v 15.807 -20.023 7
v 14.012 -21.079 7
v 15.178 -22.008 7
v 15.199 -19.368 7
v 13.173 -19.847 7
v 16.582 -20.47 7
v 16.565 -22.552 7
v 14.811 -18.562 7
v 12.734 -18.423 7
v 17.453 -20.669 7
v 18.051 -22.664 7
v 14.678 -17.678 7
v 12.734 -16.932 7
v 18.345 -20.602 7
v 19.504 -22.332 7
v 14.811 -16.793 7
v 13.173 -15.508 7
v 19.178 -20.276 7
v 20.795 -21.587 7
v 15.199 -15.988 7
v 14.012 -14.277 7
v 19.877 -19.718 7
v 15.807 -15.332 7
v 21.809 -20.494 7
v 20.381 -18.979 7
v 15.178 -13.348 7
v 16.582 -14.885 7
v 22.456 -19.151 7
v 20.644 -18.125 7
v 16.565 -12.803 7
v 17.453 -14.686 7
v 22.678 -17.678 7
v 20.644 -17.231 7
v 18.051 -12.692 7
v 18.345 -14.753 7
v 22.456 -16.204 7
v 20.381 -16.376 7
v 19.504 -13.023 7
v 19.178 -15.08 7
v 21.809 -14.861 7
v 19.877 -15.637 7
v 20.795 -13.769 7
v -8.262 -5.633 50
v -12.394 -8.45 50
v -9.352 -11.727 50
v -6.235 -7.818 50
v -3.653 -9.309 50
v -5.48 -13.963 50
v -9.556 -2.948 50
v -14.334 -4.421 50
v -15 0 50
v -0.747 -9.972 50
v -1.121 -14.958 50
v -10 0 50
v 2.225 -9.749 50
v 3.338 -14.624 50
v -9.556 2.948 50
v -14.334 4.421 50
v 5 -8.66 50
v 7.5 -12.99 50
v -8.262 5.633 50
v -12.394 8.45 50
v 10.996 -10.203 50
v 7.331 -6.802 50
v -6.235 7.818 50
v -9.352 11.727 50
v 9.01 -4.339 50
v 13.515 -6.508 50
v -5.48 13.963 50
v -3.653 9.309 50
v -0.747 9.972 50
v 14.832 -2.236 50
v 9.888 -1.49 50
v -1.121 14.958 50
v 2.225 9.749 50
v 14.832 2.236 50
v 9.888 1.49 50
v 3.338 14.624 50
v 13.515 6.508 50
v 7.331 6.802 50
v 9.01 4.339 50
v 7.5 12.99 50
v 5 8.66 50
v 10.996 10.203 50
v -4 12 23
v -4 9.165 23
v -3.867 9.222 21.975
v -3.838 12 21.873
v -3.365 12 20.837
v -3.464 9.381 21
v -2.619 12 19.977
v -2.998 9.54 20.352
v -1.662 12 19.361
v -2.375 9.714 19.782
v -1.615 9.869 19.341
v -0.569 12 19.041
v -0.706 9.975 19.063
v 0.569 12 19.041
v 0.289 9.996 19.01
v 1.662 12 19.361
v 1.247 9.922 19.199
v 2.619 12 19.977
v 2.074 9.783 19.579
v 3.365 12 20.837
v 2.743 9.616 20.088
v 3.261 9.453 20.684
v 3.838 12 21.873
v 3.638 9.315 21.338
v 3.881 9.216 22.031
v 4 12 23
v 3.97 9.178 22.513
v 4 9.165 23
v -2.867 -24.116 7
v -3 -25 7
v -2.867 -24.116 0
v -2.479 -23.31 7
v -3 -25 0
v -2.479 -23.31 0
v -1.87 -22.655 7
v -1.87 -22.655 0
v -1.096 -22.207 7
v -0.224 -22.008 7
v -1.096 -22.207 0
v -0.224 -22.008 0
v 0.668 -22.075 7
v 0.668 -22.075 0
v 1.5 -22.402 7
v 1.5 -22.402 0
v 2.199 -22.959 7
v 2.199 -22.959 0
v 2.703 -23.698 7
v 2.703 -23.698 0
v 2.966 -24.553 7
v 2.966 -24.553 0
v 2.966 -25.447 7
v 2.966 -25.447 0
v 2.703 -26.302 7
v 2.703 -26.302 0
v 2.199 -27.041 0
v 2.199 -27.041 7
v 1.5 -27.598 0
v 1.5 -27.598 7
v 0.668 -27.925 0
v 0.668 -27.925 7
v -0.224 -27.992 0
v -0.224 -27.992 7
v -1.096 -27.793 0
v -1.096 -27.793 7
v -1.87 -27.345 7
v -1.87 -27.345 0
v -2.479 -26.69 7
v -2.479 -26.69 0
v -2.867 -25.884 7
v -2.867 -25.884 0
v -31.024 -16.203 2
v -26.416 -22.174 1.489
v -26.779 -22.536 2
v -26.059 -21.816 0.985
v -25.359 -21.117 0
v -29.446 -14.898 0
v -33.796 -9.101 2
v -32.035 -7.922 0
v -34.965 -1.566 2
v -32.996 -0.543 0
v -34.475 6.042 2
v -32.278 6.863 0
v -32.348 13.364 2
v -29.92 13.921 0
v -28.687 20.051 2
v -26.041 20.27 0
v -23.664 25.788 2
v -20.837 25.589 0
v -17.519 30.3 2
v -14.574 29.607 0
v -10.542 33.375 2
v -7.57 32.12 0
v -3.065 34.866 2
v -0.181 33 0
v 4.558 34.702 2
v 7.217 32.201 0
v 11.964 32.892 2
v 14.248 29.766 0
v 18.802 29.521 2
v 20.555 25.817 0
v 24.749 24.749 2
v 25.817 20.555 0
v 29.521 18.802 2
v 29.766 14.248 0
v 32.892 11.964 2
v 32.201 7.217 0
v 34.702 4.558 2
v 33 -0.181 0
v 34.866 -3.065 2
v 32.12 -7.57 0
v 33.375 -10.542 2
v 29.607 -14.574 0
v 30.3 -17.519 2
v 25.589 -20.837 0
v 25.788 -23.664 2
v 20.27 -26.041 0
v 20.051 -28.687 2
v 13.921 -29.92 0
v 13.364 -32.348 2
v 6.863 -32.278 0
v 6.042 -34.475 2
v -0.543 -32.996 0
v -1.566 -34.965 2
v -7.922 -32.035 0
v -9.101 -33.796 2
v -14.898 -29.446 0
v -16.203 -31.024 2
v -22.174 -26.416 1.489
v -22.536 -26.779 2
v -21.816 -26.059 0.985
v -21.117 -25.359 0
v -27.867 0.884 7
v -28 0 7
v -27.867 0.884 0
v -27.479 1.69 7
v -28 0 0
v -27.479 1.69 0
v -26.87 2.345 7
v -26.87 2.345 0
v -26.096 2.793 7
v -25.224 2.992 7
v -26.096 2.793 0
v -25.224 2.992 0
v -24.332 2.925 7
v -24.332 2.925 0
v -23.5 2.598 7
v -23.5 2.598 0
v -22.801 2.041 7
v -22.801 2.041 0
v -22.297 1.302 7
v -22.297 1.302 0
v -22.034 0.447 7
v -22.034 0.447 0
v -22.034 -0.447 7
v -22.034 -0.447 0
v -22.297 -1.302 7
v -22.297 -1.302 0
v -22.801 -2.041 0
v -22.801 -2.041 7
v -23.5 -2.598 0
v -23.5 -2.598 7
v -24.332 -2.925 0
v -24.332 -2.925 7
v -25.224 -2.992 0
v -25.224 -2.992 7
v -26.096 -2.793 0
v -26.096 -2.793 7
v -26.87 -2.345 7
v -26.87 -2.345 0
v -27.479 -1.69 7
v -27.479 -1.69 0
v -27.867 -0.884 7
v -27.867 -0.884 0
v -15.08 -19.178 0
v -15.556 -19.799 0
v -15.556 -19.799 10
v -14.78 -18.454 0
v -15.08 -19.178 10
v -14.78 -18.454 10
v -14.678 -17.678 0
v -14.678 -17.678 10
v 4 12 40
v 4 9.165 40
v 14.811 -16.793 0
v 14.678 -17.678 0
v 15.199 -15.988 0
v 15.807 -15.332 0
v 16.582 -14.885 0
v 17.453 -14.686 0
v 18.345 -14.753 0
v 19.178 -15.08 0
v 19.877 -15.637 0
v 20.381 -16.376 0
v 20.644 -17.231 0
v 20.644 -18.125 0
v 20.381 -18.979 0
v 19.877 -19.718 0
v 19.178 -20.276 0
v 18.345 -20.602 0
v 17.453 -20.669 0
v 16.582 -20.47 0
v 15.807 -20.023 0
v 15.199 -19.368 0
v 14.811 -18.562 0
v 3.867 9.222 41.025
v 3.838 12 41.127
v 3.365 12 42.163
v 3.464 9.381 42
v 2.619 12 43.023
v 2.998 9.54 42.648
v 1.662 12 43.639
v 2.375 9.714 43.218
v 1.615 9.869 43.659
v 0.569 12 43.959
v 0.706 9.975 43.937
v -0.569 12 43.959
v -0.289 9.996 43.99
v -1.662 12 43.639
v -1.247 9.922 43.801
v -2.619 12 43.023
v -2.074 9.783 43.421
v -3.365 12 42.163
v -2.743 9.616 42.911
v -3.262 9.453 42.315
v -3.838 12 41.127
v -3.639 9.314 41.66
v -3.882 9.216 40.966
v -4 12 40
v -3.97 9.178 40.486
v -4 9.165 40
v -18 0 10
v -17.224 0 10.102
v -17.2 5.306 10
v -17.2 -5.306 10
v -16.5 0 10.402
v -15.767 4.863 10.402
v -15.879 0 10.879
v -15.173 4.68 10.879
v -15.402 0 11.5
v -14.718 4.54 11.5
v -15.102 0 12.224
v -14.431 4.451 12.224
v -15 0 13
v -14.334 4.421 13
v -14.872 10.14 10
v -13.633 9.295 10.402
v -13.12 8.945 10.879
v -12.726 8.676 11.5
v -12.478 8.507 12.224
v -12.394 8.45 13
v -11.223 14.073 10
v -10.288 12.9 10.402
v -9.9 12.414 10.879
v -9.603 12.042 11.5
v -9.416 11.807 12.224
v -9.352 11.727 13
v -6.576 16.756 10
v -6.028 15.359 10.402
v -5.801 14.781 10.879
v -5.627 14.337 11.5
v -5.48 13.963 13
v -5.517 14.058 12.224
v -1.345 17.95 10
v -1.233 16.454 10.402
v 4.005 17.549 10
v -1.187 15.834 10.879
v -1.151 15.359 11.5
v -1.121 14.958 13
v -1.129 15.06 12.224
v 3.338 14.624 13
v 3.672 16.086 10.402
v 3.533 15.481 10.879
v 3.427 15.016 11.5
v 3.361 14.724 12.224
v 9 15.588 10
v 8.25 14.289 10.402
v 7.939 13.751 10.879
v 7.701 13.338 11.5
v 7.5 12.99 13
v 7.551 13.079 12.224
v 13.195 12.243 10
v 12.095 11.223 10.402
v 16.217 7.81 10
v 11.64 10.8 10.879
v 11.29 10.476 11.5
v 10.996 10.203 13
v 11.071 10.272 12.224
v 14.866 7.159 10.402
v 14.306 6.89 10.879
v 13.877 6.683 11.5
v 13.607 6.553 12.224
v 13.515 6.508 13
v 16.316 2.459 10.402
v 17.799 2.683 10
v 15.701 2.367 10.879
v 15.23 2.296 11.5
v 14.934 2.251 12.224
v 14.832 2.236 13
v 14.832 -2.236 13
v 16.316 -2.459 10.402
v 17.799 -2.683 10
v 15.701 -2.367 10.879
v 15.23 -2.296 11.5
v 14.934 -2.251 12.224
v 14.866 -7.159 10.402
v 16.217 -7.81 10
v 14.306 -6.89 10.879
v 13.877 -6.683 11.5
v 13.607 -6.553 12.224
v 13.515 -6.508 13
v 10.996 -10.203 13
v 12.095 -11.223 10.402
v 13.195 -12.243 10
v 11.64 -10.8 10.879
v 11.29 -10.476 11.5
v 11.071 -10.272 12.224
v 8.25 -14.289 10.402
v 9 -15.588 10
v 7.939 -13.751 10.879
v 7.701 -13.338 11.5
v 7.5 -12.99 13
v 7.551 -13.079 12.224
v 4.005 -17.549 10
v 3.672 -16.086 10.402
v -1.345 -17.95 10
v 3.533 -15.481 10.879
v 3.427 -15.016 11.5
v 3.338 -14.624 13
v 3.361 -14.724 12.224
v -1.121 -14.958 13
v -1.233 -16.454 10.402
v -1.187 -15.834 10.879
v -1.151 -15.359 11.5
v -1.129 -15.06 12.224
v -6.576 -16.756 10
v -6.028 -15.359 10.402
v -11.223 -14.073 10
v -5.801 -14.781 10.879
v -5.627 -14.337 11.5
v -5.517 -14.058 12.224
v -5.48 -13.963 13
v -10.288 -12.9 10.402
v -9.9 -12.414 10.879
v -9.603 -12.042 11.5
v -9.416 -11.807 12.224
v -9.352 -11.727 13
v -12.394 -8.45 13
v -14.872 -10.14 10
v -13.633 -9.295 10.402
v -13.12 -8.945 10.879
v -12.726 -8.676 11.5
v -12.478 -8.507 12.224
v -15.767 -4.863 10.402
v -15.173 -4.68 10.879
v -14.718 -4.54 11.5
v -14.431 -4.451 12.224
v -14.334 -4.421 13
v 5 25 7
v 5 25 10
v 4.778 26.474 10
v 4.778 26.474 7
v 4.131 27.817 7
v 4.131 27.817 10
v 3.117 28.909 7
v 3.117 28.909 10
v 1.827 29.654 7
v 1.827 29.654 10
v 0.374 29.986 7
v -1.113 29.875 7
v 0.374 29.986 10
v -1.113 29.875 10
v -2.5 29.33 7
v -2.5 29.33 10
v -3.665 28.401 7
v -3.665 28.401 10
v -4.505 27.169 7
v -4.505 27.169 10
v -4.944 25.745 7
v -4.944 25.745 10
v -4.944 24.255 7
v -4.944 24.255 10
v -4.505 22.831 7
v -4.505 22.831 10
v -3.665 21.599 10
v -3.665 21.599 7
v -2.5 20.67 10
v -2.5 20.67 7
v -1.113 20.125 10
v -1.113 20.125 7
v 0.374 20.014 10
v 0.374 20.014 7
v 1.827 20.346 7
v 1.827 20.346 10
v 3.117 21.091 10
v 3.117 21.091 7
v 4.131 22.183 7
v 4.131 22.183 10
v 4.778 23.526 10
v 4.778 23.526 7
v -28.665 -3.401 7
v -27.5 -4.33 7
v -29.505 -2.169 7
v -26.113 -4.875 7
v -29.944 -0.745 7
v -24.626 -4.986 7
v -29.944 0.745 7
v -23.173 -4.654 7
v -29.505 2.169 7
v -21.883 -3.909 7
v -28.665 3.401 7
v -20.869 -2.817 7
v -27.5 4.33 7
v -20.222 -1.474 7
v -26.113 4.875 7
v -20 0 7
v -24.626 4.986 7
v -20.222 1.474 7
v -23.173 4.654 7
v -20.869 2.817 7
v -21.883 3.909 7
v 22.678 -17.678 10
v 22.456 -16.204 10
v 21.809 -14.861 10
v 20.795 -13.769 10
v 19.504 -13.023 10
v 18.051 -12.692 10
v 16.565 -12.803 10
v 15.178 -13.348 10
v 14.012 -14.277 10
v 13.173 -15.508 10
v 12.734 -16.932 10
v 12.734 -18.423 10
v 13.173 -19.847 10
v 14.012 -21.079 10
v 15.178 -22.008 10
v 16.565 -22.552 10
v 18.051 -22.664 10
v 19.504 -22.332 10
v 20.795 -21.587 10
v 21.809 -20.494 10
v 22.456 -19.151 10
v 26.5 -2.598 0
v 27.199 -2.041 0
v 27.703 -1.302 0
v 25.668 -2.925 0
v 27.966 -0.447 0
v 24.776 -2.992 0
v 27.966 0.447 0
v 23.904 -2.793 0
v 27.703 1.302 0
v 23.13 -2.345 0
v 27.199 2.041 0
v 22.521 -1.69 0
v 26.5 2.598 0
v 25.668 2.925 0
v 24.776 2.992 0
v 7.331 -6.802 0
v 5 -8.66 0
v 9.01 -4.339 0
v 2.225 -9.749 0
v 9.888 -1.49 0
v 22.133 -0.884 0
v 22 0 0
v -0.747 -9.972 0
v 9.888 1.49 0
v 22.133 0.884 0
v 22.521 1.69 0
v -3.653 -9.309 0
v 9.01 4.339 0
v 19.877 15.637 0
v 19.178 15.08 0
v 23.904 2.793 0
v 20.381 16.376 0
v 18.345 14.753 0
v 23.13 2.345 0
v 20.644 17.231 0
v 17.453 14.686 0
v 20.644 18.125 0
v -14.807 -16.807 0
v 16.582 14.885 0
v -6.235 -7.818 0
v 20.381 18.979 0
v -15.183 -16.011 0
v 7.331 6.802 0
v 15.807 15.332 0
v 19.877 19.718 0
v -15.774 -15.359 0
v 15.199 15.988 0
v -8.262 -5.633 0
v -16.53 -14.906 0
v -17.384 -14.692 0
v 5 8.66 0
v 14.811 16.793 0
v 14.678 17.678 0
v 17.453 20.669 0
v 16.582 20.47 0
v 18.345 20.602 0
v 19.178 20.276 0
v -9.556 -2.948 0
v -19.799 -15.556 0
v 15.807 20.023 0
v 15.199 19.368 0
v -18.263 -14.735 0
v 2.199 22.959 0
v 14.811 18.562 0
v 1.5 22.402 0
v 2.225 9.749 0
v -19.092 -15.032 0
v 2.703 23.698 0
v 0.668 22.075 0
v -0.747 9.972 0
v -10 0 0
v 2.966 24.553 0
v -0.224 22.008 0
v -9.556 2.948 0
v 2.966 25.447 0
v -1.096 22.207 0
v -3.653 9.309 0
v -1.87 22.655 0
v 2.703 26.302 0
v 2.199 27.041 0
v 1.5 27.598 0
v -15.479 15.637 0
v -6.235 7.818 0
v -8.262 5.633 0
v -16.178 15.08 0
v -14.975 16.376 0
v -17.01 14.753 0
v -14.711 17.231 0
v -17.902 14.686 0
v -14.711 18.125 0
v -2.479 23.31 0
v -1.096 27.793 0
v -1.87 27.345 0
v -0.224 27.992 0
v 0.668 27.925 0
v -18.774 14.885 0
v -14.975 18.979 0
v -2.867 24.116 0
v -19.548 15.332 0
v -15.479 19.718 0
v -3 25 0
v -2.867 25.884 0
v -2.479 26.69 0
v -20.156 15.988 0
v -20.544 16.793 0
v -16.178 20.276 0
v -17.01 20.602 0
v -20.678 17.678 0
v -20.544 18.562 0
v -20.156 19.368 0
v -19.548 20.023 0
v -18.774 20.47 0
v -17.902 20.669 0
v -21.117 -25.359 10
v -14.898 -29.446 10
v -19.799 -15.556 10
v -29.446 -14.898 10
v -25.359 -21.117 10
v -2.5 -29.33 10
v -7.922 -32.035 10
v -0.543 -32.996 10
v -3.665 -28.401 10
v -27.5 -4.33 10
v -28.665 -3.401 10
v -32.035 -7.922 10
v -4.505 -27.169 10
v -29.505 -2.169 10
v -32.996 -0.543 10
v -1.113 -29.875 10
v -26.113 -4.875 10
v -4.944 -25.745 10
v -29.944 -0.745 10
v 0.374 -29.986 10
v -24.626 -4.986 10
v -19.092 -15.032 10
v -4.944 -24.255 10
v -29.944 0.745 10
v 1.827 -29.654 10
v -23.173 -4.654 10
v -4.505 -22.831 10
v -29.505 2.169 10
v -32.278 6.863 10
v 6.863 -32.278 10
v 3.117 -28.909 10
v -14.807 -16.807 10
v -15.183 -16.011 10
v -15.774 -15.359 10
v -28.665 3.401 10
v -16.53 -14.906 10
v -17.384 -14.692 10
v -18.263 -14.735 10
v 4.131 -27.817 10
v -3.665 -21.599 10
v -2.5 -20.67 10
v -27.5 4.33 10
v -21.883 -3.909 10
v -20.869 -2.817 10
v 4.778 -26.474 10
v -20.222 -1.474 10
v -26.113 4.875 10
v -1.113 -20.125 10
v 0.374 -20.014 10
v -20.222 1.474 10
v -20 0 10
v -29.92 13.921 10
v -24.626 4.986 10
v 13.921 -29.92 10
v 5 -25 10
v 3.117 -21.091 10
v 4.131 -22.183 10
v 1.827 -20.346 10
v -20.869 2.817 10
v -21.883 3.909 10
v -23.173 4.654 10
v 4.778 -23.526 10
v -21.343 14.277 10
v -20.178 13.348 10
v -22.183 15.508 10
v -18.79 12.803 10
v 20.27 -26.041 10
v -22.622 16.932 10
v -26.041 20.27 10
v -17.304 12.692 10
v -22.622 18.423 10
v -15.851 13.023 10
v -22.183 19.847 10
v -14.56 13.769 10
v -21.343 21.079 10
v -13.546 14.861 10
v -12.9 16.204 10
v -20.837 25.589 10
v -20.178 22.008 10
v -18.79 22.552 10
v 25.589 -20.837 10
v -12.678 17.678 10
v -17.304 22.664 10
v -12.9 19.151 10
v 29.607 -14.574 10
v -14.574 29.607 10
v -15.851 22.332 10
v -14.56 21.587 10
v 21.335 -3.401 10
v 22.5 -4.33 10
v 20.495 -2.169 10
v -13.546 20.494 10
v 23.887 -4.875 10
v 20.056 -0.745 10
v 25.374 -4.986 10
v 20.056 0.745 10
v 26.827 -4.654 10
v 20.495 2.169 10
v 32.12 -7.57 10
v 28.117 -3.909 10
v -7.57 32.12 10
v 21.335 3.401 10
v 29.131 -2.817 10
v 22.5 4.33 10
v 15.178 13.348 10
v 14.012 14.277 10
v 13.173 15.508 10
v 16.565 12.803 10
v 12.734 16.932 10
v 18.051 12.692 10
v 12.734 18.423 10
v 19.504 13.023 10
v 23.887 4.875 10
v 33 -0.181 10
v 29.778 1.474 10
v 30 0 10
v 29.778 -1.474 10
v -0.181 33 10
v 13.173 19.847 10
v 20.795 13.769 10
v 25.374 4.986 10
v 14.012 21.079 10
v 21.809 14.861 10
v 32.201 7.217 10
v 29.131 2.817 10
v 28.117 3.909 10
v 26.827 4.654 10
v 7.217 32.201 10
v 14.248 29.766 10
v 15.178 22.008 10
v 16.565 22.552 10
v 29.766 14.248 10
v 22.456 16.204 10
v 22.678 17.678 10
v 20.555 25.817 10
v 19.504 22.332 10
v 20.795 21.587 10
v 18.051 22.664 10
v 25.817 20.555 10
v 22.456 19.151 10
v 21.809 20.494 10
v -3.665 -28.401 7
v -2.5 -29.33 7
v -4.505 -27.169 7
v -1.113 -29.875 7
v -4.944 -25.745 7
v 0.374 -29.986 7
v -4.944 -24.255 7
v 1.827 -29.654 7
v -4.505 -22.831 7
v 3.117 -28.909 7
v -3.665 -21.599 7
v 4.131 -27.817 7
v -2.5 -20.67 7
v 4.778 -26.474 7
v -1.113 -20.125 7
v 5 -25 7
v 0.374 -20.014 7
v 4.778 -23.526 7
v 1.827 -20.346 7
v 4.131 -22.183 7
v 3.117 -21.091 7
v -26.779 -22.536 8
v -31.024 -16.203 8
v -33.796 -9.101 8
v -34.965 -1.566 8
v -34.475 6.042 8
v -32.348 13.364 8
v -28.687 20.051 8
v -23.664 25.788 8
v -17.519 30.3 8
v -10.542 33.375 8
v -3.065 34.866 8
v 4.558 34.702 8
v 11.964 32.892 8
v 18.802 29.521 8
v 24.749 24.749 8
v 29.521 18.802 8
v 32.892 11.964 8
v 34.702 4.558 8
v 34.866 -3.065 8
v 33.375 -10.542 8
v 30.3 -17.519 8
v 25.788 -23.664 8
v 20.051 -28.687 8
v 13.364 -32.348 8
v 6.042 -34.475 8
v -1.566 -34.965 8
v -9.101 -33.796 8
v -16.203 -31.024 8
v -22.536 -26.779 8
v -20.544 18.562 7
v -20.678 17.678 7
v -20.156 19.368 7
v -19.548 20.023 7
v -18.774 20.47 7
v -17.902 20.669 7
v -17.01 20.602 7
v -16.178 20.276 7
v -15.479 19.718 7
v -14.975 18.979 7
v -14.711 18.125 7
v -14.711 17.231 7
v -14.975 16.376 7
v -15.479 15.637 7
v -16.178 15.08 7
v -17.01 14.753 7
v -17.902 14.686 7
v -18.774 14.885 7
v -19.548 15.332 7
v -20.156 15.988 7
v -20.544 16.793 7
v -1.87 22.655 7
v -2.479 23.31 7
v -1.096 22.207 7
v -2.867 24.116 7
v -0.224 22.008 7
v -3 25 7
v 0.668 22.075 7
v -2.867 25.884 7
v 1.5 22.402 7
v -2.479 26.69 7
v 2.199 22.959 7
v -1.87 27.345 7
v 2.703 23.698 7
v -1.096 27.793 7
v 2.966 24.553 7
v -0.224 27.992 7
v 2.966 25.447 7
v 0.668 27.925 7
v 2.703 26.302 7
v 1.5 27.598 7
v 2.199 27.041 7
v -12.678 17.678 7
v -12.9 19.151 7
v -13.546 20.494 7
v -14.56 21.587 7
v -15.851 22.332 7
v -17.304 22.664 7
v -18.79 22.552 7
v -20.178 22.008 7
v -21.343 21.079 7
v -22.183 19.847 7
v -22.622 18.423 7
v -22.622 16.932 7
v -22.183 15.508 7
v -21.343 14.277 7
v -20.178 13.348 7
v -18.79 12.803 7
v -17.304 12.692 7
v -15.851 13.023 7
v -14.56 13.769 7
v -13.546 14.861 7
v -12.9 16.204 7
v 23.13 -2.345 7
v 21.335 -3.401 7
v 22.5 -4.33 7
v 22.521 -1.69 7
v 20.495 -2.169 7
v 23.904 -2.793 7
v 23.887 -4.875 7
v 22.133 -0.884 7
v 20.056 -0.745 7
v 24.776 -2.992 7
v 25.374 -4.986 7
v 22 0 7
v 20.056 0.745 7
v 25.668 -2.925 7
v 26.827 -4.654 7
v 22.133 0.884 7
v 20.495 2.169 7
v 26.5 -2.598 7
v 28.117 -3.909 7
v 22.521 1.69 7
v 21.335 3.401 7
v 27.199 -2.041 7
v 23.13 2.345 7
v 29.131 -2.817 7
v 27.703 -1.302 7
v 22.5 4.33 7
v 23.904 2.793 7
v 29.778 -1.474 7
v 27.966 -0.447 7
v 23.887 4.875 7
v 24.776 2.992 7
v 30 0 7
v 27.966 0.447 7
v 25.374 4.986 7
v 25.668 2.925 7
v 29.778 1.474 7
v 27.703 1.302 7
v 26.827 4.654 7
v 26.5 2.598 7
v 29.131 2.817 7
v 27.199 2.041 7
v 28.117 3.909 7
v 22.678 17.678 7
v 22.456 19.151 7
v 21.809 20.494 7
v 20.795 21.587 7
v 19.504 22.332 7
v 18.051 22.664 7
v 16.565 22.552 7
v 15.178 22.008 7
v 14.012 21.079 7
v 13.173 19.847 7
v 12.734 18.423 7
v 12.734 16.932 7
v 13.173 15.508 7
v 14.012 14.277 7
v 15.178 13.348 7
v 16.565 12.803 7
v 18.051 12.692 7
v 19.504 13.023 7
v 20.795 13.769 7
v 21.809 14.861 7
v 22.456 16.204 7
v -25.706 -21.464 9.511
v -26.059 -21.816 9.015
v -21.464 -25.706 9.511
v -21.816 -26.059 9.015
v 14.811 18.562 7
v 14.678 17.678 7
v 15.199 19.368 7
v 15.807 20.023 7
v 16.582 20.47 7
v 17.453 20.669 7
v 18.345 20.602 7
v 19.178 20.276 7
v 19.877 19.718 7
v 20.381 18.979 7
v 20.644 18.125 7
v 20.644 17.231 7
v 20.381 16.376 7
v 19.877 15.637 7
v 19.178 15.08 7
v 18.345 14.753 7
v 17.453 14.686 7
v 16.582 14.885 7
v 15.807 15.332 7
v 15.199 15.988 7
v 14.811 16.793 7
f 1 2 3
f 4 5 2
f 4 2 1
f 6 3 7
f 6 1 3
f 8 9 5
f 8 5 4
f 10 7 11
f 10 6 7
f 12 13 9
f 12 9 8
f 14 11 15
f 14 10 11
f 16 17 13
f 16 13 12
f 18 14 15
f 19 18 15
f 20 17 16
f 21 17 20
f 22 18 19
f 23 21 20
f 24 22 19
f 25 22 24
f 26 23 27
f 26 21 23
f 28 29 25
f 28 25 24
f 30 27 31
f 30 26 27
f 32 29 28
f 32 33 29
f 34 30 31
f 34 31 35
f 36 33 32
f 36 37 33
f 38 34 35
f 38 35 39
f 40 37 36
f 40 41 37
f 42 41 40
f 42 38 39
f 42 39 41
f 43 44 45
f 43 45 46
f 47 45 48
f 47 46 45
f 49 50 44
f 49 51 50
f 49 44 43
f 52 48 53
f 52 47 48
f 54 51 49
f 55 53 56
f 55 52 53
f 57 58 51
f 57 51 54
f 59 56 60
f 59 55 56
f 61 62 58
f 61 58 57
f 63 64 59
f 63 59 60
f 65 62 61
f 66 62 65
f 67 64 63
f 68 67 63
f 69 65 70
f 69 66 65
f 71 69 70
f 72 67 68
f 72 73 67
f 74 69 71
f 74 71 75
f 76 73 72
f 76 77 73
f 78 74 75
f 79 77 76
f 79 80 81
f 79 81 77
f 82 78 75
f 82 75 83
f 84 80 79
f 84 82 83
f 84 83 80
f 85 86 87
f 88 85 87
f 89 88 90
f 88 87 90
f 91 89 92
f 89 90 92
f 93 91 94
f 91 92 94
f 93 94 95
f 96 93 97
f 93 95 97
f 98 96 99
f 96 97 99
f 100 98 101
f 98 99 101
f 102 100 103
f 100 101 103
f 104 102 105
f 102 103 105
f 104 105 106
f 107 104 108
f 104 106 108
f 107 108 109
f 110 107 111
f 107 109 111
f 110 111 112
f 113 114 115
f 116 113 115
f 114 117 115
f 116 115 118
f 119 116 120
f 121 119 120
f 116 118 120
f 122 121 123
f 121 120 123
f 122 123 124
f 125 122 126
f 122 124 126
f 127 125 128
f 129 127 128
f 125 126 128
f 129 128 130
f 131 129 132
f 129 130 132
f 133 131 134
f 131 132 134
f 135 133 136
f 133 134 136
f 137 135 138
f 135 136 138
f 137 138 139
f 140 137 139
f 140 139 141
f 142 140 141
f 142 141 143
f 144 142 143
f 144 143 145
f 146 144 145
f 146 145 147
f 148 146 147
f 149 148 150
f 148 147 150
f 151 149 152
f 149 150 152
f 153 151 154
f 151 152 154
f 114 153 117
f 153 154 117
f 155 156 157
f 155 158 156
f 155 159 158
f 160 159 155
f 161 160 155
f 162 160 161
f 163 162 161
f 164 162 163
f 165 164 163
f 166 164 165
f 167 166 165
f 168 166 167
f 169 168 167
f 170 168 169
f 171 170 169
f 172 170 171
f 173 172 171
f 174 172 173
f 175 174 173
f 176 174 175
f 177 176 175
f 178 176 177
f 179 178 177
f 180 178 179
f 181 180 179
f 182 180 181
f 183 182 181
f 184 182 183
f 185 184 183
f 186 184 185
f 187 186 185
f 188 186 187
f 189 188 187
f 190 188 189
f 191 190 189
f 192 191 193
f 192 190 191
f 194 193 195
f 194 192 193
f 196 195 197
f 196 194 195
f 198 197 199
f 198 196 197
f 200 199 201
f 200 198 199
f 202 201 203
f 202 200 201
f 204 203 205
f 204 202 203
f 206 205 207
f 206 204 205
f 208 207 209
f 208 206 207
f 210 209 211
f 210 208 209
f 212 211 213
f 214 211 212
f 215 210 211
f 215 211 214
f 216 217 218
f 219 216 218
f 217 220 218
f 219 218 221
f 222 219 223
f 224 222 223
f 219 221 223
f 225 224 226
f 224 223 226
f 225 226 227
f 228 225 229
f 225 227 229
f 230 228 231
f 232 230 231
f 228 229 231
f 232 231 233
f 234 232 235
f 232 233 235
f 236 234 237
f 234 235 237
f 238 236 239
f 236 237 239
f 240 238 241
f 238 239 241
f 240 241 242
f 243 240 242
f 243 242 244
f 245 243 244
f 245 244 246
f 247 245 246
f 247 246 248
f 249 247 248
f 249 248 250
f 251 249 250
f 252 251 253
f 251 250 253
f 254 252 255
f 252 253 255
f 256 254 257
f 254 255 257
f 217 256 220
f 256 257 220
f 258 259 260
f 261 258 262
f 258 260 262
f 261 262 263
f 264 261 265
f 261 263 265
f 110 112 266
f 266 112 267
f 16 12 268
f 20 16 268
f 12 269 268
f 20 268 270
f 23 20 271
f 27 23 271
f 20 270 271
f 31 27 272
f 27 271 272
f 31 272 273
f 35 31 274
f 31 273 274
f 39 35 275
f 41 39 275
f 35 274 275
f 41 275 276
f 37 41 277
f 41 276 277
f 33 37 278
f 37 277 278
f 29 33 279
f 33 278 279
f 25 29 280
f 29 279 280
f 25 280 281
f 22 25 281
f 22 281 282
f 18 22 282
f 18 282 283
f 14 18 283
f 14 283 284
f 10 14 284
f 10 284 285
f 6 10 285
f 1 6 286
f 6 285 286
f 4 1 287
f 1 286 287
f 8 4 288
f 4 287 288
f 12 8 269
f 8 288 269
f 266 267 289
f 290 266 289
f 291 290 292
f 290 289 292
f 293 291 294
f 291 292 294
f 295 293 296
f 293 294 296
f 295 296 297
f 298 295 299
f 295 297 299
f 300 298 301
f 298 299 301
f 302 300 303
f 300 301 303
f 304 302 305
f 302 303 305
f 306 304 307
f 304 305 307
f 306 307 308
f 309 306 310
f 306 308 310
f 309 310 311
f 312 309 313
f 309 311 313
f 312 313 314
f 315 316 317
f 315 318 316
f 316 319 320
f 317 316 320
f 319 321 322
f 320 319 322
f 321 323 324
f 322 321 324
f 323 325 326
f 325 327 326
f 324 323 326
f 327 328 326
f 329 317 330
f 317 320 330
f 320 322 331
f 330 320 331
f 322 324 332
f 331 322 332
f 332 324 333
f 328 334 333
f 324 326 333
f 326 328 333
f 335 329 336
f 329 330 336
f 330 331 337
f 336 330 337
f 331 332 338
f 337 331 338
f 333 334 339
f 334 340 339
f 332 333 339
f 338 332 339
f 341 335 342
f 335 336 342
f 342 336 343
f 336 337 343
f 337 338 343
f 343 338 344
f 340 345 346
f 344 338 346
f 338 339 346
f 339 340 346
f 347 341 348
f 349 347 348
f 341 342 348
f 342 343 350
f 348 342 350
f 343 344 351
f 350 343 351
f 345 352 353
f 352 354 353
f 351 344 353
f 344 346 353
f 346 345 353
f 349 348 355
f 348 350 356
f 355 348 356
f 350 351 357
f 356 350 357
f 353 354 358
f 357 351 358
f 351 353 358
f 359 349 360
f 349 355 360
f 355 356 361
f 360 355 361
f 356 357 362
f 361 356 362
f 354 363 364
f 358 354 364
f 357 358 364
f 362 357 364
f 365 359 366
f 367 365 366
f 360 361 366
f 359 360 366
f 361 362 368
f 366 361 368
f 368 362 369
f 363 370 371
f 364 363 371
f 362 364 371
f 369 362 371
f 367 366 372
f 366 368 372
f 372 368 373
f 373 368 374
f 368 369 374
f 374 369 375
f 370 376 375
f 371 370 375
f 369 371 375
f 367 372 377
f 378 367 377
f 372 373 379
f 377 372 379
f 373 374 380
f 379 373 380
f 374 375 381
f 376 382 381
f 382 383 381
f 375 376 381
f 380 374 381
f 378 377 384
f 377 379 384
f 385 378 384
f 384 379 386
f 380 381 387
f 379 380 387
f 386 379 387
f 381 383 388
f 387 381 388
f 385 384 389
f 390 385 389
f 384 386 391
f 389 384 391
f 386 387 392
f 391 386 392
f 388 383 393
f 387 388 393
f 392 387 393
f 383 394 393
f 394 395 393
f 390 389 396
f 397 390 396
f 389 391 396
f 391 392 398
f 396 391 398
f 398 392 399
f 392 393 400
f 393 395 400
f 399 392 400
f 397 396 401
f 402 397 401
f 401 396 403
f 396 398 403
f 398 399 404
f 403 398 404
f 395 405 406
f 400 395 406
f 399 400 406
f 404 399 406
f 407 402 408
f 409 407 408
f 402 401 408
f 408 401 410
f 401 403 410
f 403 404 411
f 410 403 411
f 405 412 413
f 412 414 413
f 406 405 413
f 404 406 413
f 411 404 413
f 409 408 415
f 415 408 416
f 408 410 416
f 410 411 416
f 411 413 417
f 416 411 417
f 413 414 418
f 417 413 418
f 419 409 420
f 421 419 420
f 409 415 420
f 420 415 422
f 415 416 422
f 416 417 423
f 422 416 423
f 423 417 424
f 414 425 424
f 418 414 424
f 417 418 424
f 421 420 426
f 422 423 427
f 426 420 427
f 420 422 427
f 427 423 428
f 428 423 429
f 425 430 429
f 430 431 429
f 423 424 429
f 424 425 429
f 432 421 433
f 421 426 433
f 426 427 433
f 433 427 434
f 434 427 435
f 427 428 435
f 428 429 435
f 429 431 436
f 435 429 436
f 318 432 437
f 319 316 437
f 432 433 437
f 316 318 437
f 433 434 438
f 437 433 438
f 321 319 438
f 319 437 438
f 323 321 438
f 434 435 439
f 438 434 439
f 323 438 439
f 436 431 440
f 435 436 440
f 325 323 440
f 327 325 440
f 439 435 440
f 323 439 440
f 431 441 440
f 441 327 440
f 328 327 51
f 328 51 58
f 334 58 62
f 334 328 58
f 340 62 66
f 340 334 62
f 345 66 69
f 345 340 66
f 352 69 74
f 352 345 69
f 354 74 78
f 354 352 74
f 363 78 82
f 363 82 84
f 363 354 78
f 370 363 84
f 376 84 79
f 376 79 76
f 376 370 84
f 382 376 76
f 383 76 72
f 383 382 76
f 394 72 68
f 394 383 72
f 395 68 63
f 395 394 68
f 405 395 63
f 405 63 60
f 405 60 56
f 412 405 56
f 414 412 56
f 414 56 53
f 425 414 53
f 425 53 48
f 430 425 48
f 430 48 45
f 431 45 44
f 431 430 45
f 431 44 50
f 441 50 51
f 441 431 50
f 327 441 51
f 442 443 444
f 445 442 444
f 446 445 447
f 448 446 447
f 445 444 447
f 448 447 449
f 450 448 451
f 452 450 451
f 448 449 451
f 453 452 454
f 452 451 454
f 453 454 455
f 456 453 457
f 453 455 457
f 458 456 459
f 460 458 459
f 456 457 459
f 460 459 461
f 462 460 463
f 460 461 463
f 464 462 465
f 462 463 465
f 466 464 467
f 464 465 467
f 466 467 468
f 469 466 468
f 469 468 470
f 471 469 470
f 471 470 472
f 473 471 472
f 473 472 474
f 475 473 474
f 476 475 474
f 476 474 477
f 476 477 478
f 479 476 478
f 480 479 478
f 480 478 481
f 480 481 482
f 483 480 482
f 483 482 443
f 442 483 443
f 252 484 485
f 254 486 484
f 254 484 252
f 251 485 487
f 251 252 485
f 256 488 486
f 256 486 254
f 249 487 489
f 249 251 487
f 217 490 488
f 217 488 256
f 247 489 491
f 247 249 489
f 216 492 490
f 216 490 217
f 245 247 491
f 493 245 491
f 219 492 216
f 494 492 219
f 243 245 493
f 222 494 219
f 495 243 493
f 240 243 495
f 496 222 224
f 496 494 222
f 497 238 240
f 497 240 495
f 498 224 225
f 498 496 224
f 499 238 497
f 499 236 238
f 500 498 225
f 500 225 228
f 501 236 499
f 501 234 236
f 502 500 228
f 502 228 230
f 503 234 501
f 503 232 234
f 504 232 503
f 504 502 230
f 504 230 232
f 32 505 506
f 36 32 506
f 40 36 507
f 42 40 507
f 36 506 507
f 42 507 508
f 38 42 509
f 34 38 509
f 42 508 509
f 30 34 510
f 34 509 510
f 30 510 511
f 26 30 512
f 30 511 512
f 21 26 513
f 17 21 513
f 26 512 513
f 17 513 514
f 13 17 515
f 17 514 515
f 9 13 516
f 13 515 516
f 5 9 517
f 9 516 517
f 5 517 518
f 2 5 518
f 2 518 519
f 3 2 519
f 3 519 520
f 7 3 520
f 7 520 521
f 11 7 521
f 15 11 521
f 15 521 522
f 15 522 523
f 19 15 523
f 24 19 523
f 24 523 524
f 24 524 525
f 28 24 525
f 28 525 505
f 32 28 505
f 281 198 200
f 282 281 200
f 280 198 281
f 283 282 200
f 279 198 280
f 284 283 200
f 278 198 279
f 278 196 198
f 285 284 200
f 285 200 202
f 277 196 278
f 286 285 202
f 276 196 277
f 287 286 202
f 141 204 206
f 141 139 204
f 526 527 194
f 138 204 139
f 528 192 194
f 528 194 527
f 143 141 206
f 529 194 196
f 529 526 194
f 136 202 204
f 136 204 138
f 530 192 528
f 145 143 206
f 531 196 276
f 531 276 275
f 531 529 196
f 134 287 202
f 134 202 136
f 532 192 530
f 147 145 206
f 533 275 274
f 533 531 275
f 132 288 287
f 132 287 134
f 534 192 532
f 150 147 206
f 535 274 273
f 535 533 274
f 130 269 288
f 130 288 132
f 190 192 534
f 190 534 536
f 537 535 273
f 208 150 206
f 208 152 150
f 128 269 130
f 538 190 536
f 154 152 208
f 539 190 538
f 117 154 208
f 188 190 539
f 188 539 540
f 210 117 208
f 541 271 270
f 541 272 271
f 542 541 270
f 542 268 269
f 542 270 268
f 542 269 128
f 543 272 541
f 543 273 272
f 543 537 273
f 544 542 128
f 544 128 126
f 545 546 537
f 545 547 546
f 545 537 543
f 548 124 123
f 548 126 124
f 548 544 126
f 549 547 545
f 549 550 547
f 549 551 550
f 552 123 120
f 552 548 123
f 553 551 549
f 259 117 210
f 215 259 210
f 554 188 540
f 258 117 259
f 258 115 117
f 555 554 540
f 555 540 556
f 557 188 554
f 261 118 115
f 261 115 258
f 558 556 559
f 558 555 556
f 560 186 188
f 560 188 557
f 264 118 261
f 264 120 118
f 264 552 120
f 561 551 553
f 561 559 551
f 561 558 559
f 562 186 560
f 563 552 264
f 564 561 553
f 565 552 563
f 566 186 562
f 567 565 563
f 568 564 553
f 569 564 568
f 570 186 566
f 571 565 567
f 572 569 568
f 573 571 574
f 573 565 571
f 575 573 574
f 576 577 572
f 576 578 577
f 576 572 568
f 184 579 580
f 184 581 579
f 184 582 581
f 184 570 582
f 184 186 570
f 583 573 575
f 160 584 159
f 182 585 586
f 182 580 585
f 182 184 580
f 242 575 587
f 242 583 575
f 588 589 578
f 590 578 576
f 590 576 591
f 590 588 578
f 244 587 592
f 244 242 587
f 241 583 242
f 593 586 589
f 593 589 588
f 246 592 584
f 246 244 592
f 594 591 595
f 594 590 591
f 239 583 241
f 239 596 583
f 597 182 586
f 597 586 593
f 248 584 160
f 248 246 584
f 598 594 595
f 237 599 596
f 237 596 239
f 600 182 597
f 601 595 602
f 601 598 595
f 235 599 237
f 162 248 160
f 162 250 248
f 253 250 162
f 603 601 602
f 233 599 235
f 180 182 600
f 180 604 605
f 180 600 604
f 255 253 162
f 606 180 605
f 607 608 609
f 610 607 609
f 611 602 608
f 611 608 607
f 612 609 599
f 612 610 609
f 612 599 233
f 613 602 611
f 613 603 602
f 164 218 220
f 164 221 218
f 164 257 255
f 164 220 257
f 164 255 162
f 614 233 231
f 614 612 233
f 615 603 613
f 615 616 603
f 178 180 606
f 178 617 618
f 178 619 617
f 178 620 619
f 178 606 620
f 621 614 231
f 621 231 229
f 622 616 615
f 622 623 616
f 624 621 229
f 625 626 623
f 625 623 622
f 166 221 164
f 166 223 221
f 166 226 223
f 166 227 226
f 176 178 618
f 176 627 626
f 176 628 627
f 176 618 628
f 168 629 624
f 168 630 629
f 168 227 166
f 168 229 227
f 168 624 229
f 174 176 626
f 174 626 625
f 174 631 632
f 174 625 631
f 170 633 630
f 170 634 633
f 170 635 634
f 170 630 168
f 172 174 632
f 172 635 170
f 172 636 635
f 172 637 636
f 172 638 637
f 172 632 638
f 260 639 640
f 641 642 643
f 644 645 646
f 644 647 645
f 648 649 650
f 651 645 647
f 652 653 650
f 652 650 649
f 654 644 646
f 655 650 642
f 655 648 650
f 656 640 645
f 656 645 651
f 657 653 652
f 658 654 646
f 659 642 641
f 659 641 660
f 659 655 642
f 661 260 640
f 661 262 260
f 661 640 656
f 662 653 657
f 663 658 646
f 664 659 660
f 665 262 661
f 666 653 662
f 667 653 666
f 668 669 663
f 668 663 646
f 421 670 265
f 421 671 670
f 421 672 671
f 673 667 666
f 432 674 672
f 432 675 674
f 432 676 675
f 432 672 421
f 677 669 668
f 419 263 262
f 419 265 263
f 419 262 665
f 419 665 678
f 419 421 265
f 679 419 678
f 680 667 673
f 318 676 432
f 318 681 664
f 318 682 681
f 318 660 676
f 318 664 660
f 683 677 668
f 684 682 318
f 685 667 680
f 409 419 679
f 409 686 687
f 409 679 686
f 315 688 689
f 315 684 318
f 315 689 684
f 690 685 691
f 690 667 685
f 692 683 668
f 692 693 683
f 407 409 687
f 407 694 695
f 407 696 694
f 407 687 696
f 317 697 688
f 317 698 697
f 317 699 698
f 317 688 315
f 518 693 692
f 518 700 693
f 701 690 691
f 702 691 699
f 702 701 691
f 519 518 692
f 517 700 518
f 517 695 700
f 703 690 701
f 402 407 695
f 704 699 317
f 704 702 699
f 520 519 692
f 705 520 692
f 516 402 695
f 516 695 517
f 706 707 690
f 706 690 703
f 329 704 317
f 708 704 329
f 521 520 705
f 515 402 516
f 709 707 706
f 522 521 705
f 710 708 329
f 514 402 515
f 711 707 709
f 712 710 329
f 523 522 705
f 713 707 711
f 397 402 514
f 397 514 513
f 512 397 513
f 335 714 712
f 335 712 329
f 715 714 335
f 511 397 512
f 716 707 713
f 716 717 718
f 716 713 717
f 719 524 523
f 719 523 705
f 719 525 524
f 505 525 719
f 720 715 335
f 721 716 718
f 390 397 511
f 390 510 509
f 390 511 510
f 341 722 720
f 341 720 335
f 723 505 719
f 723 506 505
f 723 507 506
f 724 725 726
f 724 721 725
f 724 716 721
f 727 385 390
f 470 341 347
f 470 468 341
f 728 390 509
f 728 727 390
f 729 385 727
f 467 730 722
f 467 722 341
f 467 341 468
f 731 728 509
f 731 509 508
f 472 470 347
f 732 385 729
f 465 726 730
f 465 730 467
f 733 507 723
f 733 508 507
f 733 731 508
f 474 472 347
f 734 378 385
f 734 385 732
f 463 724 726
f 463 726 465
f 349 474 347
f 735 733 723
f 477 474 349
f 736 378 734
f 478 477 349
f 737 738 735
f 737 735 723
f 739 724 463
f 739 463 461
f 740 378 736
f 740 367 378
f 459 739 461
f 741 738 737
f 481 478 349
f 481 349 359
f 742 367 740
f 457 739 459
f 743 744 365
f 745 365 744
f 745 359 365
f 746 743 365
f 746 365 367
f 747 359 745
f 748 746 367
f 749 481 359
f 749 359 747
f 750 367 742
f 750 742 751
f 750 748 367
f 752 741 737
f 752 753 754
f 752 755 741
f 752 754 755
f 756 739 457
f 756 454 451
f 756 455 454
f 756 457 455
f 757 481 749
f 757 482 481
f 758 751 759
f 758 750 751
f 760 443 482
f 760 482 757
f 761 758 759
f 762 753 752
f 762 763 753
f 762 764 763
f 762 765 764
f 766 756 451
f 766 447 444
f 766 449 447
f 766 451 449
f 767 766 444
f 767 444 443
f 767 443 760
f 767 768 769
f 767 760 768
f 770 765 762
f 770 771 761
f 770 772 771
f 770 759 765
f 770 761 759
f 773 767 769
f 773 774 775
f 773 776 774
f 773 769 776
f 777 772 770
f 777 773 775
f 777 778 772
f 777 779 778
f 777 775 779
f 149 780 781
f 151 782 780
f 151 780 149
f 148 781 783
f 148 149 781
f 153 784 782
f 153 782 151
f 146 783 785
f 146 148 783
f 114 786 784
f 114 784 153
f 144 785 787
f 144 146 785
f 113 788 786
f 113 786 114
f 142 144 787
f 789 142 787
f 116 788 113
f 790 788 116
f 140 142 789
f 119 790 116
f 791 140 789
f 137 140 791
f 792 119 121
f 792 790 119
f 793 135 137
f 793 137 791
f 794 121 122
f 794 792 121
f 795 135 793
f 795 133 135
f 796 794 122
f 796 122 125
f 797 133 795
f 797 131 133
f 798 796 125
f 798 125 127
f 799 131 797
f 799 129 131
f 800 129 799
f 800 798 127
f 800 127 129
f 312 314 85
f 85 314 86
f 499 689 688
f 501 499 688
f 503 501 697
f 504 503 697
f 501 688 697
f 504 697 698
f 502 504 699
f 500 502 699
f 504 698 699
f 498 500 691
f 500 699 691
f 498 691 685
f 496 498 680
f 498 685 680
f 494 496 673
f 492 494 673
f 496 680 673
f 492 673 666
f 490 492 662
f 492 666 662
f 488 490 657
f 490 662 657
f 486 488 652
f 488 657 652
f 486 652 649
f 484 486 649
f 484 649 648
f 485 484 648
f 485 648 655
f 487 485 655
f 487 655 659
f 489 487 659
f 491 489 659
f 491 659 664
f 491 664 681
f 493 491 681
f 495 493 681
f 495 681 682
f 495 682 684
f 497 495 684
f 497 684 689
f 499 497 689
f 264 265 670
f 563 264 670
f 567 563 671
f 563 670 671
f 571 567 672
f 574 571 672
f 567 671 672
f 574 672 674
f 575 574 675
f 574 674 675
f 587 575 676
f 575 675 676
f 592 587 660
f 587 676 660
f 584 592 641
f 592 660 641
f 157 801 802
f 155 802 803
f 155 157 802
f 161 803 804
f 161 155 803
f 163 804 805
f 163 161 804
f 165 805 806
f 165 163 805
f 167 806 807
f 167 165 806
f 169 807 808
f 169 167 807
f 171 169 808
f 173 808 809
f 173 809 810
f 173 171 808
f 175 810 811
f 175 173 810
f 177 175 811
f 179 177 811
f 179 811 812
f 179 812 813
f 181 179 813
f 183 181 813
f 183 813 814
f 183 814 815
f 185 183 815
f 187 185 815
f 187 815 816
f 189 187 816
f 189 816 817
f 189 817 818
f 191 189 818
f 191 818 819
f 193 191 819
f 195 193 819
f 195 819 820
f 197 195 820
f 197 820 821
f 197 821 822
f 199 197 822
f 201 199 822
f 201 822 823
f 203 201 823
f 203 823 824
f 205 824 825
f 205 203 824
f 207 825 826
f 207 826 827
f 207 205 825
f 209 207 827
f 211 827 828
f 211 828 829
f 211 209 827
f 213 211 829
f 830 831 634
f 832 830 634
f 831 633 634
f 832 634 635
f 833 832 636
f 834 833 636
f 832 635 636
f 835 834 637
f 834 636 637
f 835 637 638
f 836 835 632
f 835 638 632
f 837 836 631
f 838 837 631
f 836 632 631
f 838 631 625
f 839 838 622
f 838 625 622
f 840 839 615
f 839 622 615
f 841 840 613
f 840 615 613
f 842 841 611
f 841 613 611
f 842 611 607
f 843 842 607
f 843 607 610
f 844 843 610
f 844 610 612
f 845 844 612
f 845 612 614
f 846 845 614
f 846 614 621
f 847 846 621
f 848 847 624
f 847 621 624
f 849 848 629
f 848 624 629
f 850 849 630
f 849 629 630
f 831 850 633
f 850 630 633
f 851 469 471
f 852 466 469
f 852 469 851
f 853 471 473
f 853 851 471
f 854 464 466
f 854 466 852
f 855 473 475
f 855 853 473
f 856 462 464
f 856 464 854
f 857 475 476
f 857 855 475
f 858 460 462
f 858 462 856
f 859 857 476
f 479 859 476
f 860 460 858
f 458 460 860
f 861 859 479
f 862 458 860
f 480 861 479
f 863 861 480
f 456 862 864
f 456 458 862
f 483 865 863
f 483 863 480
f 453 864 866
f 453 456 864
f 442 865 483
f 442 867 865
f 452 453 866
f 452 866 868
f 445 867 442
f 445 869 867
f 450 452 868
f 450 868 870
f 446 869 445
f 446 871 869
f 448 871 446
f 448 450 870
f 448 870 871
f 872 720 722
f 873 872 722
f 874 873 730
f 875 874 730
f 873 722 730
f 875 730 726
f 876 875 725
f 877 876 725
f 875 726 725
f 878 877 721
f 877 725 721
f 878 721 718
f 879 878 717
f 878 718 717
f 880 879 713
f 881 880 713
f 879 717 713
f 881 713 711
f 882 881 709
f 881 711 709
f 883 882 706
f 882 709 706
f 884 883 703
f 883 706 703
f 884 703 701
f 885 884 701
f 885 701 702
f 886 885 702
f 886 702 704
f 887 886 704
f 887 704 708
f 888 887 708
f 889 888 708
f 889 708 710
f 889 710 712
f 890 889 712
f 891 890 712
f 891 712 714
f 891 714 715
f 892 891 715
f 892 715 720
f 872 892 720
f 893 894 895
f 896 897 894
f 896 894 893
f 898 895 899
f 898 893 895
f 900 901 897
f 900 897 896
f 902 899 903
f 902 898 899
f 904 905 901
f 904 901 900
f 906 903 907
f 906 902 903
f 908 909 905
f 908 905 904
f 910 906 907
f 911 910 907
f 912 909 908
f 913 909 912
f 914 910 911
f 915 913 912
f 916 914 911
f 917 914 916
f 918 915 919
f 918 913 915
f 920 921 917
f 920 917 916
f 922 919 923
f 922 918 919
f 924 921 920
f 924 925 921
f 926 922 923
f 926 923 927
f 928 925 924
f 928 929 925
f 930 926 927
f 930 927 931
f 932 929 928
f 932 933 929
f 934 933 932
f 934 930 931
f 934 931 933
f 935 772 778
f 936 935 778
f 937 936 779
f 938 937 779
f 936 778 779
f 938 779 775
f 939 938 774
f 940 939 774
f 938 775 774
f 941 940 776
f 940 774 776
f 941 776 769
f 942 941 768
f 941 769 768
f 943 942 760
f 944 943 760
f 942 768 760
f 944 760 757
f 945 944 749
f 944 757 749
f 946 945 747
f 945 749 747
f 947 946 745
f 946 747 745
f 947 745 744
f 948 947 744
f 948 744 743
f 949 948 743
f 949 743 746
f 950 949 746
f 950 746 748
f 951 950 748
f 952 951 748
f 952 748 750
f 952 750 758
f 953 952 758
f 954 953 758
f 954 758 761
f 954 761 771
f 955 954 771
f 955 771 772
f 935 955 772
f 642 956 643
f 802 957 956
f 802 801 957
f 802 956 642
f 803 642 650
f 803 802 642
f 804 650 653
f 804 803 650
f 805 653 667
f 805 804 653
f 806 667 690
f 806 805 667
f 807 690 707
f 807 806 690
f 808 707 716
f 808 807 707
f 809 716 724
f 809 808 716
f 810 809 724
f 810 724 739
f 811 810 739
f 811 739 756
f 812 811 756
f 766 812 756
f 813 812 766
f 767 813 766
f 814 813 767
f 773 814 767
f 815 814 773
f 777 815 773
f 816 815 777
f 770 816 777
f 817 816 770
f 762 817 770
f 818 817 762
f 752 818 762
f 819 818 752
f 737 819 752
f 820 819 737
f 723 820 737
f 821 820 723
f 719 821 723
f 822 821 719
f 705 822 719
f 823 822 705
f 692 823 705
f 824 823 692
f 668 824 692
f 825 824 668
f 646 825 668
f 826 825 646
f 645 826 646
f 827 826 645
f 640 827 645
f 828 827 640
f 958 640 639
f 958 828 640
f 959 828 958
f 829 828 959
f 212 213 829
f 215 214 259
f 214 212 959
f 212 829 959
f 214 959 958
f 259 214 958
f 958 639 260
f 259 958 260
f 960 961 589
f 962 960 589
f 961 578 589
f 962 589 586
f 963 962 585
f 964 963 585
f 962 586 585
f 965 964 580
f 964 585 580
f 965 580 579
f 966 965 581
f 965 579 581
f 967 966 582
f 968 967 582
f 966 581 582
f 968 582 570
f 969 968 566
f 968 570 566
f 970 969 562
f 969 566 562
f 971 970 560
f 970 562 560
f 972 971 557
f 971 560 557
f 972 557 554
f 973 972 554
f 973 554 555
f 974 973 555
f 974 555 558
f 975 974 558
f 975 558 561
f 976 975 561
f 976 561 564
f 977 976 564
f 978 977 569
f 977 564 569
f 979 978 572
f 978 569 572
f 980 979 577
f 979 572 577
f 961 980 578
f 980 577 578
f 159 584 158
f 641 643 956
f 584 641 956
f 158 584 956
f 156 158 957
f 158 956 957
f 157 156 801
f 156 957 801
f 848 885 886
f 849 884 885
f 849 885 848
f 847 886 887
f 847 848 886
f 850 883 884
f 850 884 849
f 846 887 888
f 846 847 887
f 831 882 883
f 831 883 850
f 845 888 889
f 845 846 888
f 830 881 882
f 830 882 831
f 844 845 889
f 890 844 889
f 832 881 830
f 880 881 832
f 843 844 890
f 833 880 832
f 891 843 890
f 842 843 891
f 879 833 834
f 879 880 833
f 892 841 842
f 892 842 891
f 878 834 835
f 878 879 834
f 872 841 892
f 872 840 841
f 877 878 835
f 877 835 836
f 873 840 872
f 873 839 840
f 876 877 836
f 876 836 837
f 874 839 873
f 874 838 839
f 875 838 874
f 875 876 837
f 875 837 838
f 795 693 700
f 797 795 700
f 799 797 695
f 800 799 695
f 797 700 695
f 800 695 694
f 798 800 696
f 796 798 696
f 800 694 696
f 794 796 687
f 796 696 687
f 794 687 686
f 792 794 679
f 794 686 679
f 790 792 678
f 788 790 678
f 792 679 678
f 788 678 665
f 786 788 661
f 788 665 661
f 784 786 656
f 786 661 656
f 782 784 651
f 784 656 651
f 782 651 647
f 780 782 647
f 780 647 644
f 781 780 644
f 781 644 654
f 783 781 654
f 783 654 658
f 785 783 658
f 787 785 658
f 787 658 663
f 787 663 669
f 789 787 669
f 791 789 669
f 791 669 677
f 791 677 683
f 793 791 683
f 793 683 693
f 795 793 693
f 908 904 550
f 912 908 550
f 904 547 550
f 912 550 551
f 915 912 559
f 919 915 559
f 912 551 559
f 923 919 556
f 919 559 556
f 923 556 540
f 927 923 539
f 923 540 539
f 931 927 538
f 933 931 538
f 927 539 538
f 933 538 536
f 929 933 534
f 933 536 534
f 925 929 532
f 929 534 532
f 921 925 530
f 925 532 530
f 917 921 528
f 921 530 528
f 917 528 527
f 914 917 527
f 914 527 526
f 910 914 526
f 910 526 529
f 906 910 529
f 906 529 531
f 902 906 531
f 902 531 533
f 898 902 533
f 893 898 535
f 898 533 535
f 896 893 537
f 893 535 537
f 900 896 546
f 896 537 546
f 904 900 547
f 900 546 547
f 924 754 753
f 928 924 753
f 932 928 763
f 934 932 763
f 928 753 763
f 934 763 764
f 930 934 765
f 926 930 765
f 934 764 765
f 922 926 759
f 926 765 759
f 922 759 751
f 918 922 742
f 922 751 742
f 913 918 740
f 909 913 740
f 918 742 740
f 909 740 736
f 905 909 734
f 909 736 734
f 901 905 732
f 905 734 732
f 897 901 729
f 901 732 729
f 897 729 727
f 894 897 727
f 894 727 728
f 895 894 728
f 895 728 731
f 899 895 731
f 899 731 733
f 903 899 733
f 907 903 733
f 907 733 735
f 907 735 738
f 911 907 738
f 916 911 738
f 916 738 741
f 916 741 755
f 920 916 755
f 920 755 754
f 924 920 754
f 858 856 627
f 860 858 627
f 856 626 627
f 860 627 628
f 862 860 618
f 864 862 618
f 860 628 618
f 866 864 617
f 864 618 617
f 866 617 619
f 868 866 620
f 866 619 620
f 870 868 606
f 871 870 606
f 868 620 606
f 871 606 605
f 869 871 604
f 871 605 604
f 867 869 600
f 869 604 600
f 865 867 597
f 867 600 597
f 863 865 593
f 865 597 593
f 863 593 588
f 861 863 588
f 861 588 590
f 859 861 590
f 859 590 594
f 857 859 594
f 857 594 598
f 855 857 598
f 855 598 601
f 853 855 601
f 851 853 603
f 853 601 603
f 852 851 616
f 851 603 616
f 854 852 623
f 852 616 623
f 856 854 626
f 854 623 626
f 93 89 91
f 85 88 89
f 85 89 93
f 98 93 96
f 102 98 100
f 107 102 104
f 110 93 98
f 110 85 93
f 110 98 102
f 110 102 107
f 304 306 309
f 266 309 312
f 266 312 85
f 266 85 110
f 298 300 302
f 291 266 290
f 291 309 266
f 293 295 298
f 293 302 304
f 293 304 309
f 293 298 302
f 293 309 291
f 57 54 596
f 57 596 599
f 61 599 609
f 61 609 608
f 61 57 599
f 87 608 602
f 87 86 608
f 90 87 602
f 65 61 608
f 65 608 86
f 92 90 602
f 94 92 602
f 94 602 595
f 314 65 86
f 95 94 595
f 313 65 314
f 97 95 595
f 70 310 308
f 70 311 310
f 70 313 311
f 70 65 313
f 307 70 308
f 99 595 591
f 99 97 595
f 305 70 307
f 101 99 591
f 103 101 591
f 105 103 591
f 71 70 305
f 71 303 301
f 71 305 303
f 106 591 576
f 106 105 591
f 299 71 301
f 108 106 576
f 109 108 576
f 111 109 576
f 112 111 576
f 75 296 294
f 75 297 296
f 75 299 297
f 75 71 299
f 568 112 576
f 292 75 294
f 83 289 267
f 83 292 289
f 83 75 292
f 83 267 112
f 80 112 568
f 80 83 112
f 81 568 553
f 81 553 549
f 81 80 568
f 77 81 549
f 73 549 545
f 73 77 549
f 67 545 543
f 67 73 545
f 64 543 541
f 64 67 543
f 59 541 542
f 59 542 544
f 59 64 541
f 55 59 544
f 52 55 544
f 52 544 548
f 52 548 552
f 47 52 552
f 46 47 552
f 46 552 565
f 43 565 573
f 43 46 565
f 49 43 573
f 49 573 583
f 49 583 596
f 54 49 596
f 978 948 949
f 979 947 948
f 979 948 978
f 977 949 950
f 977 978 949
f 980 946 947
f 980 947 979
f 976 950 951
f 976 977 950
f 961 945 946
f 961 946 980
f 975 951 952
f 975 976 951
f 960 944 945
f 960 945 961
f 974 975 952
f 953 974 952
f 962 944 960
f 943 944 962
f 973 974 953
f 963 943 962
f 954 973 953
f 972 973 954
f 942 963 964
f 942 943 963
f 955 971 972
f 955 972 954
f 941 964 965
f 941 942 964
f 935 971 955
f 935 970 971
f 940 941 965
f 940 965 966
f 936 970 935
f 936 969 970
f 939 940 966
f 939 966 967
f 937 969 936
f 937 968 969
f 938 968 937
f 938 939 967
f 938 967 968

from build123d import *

# Parameters (mm, degrees)
F3_D           = 6
F3_CBORE_D     = 10
F3_CBORE_DEPTH = 3
F4_DEPTH       = 10.001
F6_DEPTH       = 12
F7_R           = 3
F8_SIZE        = 2


with BuildPart() as f1:
    # F0 (on Front) → F1 (revolve)
    with BuildSketch(Plane.XZ):
        Polygon((-35, 0), (-10, 0), (-10, 50), (-15, 50), (-15, 10), (-35, 10), align=None)
    revolve(axis=Axis((0, 0, 25), (0, 0, -1)))

    # F3 (through all)
    with Locations(Plane.XY.offset(10)):
        with Locations((-17.67767, 17.67767), (0, 25), (17.67767, 17.67767), (25, 0), (0, -25), (-25, 0), (17.67767, -17.67767)):
            CounterBoreHole(F3_D / 2, F3_CBORE_D / 2, F3_CBORE_DEPTH)

    # F2 (on face) → F4 (cut, through all)
    with BuildSketch(Plane.XY.offset(10)):
        with BuildLine():
            ThreePointArc((-15.556349, -19.79899), (-19.79899, -19.79899), (-19.79899, -15.556349))
            Line((-19.79899, -15.556349), (-26.778976, -22.536336))
            ThreePointArc((-26.778976, -22.536336), (-24.748737, -24.748737), (-22.536336, -26.778976))
            Line((-22.536336, -26.778976), (-15.556349, -19.79899))
        make_face()
        with BuildLine():
            ThreePointArc((-15.556349, -19.79899), (-14.906031, -18.82572), (-14.67767, -17.67767))
            ThreePointArc((-14.67767, -17.67767), (-16.529619, -14.906031), (-19.79899, -15.556349))
            ThreePointArc((-19.79899, -15.556349), (-19.79899, -19.79899), (-15.556349, -19.79899))
        make_face()
    extrude(amount=-F4_DEPTH, mode=Mode.SUBTRACT)

    # F5 (on Front) → F6 (cut)
    with BuildSketch(Plane.XZ):
        with BuildLine():
            ThreePointArc((-4, 40), (0, 36), (4, 40))
            ThreePointArc((4, 40), (0, 44), (-4, 40))
        make_face()
        with BuildLine():
            Line((4, 23), (4, 40))
            ThreePointArc((4, 40), (0, 36), (-4, 40))
            Line((-4, 40), (-4, 23))
            ThreePointArc((-4, 23), (0, 27), (4, 23))
        make_face()
        with BuildLine():
            ThreePointArc((-4, 23), (0, 19), (4, 23))
            ThreePointArc((4, 23), (0, 27), (-4, 23))
        make_face()
    extrude(amount=-F6_DEPTH, mode=Mode.SUBTRACT)

    # F7
    f7_edges = [f1.edges().sort_by_distance(p)[0] for p in [
        (15, 0, 10),
    ]]
    fillet(f7_edges, radius=F7_R)

    # F8
    f8_edges = [f1.edges().sort_by_distance(p)[0] for p in [
        (24.748737, 24.748737, 10),
        (24.748737, 24.748737, 0),
    ]]
    chamfer(f8_edges, length=F8_SIZE)


solid = f1.part
